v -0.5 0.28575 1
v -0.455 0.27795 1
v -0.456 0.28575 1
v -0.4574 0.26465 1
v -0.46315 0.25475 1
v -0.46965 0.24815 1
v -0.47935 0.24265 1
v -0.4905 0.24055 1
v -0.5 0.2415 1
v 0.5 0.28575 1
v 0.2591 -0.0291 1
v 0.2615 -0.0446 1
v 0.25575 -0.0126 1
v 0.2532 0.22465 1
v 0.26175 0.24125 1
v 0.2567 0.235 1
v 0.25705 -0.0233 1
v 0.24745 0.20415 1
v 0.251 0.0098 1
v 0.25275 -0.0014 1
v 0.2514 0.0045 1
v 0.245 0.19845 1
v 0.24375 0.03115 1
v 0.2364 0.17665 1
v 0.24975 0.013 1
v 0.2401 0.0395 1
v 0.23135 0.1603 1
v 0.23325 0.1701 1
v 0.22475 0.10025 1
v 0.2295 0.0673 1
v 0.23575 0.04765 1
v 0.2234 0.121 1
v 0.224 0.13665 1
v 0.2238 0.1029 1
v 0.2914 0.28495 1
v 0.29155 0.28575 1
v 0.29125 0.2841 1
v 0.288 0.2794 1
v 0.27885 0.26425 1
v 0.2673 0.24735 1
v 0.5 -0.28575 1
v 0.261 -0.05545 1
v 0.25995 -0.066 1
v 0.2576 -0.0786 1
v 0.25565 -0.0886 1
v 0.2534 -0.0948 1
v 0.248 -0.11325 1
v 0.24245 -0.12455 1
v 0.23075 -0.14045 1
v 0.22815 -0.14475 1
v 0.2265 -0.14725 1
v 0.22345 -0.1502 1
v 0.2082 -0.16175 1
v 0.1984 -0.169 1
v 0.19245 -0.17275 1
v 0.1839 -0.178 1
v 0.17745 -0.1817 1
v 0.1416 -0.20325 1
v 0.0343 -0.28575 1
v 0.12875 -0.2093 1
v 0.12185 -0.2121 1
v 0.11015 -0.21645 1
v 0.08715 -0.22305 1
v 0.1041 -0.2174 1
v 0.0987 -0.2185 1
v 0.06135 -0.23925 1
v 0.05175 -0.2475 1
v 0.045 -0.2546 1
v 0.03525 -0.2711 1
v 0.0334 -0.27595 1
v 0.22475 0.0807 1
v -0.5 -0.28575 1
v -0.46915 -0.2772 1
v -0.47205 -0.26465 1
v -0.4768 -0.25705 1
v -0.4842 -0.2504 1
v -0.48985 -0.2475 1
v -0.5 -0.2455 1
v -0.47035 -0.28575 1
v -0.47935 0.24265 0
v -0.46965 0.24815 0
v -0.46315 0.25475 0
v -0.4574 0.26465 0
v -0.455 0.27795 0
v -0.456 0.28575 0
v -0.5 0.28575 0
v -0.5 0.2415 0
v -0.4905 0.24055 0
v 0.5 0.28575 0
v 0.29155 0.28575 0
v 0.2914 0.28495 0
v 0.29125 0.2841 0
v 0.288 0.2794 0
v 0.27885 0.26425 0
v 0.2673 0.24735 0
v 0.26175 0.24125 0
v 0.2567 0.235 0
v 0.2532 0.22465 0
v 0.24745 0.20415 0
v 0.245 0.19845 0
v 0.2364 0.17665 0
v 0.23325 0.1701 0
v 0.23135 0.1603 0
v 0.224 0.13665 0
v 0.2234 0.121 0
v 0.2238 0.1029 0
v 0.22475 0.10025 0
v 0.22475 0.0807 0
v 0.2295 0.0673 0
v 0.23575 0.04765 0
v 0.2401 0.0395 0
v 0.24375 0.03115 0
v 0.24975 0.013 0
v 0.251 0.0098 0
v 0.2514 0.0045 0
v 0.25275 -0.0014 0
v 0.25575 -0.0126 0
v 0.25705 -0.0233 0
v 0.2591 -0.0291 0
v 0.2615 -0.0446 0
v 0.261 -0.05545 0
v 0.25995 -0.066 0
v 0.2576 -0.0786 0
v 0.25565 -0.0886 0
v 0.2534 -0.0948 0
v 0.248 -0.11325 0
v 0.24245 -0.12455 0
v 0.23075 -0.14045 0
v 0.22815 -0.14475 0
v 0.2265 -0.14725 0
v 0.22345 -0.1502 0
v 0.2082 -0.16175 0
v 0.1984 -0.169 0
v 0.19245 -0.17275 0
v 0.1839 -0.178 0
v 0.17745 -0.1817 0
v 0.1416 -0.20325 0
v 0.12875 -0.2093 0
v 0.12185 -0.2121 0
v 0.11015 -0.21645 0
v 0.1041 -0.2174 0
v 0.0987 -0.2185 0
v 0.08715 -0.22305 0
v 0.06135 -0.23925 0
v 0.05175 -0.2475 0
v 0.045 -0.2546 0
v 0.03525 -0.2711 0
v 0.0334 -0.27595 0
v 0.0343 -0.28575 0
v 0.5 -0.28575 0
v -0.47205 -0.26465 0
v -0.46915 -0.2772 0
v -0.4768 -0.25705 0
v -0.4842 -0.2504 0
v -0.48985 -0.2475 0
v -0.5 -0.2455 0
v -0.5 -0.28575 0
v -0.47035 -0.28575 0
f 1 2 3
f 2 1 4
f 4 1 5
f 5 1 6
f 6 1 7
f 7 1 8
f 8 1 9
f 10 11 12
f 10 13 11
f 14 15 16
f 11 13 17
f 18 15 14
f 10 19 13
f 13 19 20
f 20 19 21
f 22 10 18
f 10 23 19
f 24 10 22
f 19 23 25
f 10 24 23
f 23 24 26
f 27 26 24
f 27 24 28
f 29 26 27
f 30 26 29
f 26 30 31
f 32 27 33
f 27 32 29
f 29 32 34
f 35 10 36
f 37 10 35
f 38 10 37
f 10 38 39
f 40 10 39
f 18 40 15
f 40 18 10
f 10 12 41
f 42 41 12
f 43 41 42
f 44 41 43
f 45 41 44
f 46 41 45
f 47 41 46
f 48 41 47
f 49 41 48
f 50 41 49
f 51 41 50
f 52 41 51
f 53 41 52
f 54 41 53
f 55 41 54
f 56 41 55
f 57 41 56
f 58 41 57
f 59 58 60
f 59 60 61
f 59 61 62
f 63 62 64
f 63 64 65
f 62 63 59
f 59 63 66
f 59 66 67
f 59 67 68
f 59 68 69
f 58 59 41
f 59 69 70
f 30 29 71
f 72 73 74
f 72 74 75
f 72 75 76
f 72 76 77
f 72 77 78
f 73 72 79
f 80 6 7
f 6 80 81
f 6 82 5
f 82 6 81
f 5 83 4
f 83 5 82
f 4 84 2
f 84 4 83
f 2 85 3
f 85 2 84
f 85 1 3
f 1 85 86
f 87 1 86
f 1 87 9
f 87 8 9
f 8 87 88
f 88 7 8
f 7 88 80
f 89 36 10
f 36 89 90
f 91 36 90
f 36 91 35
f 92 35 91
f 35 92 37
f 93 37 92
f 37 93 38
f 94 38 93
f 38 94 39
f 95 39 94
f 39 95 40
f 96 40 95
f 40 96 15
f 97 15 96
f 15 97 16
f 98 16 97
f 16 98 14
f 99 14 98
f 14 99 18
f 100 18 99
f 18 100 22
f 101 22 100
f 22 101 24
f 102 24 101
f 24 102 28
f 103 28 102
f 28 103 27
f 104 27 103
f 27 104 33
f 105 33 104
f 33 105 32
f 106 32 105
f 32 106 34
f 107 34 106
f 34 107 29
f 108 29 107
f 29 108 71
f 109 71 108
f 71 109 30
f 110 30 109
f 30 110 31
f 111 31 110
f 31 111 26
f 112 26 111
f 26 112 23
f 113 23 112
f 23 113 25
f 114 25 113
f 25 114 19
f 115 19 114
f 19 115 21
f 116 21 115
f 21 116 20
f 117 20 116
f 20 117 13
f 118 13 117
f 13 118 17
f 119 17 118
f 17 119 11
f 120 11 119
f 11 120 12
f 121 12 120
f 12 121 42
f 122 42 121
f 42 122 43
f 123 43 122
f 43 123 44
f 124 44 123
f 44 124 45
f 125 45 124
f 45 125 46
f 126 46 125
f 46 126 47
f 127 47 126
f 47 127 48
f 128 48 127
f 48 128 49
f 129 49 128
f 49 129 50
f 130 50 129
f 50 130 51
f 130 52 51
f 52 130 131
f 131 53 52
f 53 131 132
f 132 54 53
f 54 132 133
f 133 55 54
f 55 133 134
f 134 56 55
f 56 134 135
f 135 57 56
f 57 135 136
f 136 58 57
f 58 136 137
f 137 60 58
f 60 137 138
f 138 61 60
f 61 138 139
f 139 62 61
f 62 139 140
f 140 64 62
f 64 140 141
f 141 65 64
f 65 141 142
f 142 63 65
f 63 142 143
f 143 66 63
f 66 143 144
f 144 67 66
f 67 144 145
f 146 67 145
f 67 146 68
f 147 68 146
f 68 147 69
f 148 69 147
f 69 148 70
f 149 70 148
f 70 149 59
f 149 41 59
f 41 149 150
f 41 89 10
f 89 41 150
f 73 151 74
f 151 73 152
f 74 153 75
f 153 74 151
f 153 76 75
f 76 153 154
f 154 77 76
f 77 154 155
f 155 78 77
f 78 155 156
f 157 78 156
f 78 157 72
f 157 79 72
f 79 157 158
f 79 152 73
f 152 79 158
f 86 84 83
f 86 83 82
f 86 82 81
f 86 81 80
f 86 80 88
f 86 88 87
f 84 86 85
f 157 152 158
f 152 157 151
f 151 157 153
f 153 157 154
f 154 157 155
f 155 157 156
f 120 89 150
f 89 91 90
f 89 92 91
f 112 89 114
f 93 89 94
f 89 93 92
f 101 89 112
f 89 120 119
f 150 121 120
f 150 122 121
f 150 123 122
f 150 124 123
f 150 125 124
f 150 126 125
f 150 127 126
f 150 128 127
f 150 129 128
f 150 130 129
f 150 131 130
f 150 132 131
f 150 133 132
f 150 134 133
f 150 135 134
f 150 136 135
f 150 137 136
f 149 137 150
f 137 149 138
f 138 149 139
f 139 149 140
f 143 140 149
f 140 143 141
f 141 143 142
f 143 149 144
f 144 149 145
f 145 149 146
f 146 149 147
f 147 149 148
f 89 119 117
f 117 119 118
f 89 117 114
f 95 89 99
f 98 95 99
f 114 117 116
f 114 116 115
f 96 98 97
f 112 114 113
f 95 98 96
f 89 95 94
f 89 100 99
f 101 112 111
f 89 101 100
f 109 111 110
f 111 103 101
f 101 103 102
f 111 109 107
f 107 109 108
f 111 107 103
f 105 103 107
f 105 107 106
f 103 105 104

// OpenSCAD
module card4red_1()
{
 /* Generated by trace2scad version 20150415
    http://aggregate.org/MAKE/TRACE2SCAD/
    Optimized model has 81/547 original points
 */
 color([0.5, 0.5, 0.5])
 assign(minx=0) /* polygon minx=0 */
 assign(miny=0) /* polygon miny=0 */
 assign(maxx=20000) /* polygon maxx=20000 */
 assign(maxy=11430) /* polygon maxy=11430 */
 assign(dx=maxx-minx)
 assign(dy=maxy-miny)
 assign(maxd=((dx>dy)?dx:dy))
 scale([1/maxd, 1/maxd, 1])
 translate([-minx-dx/2, -miny-dy/2, 0])
 linear_extrude(height=1, convexity=81)
 union() {
  union() {
   polygon([[0,10988],[0,10545],[190,10526],[413,10568],[607,10678],[737,10810],[852,11008],[900,11274],[880,11430],[0,11430]], convexity=5);
   polygon([[15828,11414],[15825,11397],[15760,11303],[15577,11000],[15346,10662],[15235,10540],[15134,10415],[15064,10208],[14949,9798],[14900,9684],[14728,9248],[14665,9117],[14627,8921],[14480,8448],[14468,8135],[14476,7773],[14495,7720],[14495,7329],[14590,7061],[14715,6668],[14802,6505],[14875,6338],[14995,5975],[15020,5911],[15028,5805],[15055,5687],[15115,5463],[15141,5249],[15182,5133],[15230,4823],[15220,4606],[15199,4395],[15152,4143],[15113,3943],[15068,3819],[14960,3450],[14849,3224],[14615,2906],[14563,2820],[14530,2770],[14469,2711],[14164,2480],[13968,2335],[13849,2260],[13678,2155],[13549,2081],[12832,1650],[12575,1529],[12437,1473],[12203,1386],[12082,1367],[11974,1345],[11743,1254],[11227,930],[11035,765],[10900,623],[10705,293],[10668,196],[10686,0],[20000,0],[20000,11430],[15831,11430]], convexity=8);
   polygon([[0,403],[0,0],[593,0],[617,171],[559,422],[464,574],[316,707],[203,765],[0,805]], convexity=5);
  }
 }
}

module card4red()
{
 /* all layers combined, scaled to within a 1mm cube */
 scale([1, 1, 1/1])
 difference() {
  union() {
   scale([1,1,2]) translate([0,0,-0.5]) card4red_1();
  }
  translate([0,0,-2]) cube([2,2,4],center=true);
 }
}
card4red();
